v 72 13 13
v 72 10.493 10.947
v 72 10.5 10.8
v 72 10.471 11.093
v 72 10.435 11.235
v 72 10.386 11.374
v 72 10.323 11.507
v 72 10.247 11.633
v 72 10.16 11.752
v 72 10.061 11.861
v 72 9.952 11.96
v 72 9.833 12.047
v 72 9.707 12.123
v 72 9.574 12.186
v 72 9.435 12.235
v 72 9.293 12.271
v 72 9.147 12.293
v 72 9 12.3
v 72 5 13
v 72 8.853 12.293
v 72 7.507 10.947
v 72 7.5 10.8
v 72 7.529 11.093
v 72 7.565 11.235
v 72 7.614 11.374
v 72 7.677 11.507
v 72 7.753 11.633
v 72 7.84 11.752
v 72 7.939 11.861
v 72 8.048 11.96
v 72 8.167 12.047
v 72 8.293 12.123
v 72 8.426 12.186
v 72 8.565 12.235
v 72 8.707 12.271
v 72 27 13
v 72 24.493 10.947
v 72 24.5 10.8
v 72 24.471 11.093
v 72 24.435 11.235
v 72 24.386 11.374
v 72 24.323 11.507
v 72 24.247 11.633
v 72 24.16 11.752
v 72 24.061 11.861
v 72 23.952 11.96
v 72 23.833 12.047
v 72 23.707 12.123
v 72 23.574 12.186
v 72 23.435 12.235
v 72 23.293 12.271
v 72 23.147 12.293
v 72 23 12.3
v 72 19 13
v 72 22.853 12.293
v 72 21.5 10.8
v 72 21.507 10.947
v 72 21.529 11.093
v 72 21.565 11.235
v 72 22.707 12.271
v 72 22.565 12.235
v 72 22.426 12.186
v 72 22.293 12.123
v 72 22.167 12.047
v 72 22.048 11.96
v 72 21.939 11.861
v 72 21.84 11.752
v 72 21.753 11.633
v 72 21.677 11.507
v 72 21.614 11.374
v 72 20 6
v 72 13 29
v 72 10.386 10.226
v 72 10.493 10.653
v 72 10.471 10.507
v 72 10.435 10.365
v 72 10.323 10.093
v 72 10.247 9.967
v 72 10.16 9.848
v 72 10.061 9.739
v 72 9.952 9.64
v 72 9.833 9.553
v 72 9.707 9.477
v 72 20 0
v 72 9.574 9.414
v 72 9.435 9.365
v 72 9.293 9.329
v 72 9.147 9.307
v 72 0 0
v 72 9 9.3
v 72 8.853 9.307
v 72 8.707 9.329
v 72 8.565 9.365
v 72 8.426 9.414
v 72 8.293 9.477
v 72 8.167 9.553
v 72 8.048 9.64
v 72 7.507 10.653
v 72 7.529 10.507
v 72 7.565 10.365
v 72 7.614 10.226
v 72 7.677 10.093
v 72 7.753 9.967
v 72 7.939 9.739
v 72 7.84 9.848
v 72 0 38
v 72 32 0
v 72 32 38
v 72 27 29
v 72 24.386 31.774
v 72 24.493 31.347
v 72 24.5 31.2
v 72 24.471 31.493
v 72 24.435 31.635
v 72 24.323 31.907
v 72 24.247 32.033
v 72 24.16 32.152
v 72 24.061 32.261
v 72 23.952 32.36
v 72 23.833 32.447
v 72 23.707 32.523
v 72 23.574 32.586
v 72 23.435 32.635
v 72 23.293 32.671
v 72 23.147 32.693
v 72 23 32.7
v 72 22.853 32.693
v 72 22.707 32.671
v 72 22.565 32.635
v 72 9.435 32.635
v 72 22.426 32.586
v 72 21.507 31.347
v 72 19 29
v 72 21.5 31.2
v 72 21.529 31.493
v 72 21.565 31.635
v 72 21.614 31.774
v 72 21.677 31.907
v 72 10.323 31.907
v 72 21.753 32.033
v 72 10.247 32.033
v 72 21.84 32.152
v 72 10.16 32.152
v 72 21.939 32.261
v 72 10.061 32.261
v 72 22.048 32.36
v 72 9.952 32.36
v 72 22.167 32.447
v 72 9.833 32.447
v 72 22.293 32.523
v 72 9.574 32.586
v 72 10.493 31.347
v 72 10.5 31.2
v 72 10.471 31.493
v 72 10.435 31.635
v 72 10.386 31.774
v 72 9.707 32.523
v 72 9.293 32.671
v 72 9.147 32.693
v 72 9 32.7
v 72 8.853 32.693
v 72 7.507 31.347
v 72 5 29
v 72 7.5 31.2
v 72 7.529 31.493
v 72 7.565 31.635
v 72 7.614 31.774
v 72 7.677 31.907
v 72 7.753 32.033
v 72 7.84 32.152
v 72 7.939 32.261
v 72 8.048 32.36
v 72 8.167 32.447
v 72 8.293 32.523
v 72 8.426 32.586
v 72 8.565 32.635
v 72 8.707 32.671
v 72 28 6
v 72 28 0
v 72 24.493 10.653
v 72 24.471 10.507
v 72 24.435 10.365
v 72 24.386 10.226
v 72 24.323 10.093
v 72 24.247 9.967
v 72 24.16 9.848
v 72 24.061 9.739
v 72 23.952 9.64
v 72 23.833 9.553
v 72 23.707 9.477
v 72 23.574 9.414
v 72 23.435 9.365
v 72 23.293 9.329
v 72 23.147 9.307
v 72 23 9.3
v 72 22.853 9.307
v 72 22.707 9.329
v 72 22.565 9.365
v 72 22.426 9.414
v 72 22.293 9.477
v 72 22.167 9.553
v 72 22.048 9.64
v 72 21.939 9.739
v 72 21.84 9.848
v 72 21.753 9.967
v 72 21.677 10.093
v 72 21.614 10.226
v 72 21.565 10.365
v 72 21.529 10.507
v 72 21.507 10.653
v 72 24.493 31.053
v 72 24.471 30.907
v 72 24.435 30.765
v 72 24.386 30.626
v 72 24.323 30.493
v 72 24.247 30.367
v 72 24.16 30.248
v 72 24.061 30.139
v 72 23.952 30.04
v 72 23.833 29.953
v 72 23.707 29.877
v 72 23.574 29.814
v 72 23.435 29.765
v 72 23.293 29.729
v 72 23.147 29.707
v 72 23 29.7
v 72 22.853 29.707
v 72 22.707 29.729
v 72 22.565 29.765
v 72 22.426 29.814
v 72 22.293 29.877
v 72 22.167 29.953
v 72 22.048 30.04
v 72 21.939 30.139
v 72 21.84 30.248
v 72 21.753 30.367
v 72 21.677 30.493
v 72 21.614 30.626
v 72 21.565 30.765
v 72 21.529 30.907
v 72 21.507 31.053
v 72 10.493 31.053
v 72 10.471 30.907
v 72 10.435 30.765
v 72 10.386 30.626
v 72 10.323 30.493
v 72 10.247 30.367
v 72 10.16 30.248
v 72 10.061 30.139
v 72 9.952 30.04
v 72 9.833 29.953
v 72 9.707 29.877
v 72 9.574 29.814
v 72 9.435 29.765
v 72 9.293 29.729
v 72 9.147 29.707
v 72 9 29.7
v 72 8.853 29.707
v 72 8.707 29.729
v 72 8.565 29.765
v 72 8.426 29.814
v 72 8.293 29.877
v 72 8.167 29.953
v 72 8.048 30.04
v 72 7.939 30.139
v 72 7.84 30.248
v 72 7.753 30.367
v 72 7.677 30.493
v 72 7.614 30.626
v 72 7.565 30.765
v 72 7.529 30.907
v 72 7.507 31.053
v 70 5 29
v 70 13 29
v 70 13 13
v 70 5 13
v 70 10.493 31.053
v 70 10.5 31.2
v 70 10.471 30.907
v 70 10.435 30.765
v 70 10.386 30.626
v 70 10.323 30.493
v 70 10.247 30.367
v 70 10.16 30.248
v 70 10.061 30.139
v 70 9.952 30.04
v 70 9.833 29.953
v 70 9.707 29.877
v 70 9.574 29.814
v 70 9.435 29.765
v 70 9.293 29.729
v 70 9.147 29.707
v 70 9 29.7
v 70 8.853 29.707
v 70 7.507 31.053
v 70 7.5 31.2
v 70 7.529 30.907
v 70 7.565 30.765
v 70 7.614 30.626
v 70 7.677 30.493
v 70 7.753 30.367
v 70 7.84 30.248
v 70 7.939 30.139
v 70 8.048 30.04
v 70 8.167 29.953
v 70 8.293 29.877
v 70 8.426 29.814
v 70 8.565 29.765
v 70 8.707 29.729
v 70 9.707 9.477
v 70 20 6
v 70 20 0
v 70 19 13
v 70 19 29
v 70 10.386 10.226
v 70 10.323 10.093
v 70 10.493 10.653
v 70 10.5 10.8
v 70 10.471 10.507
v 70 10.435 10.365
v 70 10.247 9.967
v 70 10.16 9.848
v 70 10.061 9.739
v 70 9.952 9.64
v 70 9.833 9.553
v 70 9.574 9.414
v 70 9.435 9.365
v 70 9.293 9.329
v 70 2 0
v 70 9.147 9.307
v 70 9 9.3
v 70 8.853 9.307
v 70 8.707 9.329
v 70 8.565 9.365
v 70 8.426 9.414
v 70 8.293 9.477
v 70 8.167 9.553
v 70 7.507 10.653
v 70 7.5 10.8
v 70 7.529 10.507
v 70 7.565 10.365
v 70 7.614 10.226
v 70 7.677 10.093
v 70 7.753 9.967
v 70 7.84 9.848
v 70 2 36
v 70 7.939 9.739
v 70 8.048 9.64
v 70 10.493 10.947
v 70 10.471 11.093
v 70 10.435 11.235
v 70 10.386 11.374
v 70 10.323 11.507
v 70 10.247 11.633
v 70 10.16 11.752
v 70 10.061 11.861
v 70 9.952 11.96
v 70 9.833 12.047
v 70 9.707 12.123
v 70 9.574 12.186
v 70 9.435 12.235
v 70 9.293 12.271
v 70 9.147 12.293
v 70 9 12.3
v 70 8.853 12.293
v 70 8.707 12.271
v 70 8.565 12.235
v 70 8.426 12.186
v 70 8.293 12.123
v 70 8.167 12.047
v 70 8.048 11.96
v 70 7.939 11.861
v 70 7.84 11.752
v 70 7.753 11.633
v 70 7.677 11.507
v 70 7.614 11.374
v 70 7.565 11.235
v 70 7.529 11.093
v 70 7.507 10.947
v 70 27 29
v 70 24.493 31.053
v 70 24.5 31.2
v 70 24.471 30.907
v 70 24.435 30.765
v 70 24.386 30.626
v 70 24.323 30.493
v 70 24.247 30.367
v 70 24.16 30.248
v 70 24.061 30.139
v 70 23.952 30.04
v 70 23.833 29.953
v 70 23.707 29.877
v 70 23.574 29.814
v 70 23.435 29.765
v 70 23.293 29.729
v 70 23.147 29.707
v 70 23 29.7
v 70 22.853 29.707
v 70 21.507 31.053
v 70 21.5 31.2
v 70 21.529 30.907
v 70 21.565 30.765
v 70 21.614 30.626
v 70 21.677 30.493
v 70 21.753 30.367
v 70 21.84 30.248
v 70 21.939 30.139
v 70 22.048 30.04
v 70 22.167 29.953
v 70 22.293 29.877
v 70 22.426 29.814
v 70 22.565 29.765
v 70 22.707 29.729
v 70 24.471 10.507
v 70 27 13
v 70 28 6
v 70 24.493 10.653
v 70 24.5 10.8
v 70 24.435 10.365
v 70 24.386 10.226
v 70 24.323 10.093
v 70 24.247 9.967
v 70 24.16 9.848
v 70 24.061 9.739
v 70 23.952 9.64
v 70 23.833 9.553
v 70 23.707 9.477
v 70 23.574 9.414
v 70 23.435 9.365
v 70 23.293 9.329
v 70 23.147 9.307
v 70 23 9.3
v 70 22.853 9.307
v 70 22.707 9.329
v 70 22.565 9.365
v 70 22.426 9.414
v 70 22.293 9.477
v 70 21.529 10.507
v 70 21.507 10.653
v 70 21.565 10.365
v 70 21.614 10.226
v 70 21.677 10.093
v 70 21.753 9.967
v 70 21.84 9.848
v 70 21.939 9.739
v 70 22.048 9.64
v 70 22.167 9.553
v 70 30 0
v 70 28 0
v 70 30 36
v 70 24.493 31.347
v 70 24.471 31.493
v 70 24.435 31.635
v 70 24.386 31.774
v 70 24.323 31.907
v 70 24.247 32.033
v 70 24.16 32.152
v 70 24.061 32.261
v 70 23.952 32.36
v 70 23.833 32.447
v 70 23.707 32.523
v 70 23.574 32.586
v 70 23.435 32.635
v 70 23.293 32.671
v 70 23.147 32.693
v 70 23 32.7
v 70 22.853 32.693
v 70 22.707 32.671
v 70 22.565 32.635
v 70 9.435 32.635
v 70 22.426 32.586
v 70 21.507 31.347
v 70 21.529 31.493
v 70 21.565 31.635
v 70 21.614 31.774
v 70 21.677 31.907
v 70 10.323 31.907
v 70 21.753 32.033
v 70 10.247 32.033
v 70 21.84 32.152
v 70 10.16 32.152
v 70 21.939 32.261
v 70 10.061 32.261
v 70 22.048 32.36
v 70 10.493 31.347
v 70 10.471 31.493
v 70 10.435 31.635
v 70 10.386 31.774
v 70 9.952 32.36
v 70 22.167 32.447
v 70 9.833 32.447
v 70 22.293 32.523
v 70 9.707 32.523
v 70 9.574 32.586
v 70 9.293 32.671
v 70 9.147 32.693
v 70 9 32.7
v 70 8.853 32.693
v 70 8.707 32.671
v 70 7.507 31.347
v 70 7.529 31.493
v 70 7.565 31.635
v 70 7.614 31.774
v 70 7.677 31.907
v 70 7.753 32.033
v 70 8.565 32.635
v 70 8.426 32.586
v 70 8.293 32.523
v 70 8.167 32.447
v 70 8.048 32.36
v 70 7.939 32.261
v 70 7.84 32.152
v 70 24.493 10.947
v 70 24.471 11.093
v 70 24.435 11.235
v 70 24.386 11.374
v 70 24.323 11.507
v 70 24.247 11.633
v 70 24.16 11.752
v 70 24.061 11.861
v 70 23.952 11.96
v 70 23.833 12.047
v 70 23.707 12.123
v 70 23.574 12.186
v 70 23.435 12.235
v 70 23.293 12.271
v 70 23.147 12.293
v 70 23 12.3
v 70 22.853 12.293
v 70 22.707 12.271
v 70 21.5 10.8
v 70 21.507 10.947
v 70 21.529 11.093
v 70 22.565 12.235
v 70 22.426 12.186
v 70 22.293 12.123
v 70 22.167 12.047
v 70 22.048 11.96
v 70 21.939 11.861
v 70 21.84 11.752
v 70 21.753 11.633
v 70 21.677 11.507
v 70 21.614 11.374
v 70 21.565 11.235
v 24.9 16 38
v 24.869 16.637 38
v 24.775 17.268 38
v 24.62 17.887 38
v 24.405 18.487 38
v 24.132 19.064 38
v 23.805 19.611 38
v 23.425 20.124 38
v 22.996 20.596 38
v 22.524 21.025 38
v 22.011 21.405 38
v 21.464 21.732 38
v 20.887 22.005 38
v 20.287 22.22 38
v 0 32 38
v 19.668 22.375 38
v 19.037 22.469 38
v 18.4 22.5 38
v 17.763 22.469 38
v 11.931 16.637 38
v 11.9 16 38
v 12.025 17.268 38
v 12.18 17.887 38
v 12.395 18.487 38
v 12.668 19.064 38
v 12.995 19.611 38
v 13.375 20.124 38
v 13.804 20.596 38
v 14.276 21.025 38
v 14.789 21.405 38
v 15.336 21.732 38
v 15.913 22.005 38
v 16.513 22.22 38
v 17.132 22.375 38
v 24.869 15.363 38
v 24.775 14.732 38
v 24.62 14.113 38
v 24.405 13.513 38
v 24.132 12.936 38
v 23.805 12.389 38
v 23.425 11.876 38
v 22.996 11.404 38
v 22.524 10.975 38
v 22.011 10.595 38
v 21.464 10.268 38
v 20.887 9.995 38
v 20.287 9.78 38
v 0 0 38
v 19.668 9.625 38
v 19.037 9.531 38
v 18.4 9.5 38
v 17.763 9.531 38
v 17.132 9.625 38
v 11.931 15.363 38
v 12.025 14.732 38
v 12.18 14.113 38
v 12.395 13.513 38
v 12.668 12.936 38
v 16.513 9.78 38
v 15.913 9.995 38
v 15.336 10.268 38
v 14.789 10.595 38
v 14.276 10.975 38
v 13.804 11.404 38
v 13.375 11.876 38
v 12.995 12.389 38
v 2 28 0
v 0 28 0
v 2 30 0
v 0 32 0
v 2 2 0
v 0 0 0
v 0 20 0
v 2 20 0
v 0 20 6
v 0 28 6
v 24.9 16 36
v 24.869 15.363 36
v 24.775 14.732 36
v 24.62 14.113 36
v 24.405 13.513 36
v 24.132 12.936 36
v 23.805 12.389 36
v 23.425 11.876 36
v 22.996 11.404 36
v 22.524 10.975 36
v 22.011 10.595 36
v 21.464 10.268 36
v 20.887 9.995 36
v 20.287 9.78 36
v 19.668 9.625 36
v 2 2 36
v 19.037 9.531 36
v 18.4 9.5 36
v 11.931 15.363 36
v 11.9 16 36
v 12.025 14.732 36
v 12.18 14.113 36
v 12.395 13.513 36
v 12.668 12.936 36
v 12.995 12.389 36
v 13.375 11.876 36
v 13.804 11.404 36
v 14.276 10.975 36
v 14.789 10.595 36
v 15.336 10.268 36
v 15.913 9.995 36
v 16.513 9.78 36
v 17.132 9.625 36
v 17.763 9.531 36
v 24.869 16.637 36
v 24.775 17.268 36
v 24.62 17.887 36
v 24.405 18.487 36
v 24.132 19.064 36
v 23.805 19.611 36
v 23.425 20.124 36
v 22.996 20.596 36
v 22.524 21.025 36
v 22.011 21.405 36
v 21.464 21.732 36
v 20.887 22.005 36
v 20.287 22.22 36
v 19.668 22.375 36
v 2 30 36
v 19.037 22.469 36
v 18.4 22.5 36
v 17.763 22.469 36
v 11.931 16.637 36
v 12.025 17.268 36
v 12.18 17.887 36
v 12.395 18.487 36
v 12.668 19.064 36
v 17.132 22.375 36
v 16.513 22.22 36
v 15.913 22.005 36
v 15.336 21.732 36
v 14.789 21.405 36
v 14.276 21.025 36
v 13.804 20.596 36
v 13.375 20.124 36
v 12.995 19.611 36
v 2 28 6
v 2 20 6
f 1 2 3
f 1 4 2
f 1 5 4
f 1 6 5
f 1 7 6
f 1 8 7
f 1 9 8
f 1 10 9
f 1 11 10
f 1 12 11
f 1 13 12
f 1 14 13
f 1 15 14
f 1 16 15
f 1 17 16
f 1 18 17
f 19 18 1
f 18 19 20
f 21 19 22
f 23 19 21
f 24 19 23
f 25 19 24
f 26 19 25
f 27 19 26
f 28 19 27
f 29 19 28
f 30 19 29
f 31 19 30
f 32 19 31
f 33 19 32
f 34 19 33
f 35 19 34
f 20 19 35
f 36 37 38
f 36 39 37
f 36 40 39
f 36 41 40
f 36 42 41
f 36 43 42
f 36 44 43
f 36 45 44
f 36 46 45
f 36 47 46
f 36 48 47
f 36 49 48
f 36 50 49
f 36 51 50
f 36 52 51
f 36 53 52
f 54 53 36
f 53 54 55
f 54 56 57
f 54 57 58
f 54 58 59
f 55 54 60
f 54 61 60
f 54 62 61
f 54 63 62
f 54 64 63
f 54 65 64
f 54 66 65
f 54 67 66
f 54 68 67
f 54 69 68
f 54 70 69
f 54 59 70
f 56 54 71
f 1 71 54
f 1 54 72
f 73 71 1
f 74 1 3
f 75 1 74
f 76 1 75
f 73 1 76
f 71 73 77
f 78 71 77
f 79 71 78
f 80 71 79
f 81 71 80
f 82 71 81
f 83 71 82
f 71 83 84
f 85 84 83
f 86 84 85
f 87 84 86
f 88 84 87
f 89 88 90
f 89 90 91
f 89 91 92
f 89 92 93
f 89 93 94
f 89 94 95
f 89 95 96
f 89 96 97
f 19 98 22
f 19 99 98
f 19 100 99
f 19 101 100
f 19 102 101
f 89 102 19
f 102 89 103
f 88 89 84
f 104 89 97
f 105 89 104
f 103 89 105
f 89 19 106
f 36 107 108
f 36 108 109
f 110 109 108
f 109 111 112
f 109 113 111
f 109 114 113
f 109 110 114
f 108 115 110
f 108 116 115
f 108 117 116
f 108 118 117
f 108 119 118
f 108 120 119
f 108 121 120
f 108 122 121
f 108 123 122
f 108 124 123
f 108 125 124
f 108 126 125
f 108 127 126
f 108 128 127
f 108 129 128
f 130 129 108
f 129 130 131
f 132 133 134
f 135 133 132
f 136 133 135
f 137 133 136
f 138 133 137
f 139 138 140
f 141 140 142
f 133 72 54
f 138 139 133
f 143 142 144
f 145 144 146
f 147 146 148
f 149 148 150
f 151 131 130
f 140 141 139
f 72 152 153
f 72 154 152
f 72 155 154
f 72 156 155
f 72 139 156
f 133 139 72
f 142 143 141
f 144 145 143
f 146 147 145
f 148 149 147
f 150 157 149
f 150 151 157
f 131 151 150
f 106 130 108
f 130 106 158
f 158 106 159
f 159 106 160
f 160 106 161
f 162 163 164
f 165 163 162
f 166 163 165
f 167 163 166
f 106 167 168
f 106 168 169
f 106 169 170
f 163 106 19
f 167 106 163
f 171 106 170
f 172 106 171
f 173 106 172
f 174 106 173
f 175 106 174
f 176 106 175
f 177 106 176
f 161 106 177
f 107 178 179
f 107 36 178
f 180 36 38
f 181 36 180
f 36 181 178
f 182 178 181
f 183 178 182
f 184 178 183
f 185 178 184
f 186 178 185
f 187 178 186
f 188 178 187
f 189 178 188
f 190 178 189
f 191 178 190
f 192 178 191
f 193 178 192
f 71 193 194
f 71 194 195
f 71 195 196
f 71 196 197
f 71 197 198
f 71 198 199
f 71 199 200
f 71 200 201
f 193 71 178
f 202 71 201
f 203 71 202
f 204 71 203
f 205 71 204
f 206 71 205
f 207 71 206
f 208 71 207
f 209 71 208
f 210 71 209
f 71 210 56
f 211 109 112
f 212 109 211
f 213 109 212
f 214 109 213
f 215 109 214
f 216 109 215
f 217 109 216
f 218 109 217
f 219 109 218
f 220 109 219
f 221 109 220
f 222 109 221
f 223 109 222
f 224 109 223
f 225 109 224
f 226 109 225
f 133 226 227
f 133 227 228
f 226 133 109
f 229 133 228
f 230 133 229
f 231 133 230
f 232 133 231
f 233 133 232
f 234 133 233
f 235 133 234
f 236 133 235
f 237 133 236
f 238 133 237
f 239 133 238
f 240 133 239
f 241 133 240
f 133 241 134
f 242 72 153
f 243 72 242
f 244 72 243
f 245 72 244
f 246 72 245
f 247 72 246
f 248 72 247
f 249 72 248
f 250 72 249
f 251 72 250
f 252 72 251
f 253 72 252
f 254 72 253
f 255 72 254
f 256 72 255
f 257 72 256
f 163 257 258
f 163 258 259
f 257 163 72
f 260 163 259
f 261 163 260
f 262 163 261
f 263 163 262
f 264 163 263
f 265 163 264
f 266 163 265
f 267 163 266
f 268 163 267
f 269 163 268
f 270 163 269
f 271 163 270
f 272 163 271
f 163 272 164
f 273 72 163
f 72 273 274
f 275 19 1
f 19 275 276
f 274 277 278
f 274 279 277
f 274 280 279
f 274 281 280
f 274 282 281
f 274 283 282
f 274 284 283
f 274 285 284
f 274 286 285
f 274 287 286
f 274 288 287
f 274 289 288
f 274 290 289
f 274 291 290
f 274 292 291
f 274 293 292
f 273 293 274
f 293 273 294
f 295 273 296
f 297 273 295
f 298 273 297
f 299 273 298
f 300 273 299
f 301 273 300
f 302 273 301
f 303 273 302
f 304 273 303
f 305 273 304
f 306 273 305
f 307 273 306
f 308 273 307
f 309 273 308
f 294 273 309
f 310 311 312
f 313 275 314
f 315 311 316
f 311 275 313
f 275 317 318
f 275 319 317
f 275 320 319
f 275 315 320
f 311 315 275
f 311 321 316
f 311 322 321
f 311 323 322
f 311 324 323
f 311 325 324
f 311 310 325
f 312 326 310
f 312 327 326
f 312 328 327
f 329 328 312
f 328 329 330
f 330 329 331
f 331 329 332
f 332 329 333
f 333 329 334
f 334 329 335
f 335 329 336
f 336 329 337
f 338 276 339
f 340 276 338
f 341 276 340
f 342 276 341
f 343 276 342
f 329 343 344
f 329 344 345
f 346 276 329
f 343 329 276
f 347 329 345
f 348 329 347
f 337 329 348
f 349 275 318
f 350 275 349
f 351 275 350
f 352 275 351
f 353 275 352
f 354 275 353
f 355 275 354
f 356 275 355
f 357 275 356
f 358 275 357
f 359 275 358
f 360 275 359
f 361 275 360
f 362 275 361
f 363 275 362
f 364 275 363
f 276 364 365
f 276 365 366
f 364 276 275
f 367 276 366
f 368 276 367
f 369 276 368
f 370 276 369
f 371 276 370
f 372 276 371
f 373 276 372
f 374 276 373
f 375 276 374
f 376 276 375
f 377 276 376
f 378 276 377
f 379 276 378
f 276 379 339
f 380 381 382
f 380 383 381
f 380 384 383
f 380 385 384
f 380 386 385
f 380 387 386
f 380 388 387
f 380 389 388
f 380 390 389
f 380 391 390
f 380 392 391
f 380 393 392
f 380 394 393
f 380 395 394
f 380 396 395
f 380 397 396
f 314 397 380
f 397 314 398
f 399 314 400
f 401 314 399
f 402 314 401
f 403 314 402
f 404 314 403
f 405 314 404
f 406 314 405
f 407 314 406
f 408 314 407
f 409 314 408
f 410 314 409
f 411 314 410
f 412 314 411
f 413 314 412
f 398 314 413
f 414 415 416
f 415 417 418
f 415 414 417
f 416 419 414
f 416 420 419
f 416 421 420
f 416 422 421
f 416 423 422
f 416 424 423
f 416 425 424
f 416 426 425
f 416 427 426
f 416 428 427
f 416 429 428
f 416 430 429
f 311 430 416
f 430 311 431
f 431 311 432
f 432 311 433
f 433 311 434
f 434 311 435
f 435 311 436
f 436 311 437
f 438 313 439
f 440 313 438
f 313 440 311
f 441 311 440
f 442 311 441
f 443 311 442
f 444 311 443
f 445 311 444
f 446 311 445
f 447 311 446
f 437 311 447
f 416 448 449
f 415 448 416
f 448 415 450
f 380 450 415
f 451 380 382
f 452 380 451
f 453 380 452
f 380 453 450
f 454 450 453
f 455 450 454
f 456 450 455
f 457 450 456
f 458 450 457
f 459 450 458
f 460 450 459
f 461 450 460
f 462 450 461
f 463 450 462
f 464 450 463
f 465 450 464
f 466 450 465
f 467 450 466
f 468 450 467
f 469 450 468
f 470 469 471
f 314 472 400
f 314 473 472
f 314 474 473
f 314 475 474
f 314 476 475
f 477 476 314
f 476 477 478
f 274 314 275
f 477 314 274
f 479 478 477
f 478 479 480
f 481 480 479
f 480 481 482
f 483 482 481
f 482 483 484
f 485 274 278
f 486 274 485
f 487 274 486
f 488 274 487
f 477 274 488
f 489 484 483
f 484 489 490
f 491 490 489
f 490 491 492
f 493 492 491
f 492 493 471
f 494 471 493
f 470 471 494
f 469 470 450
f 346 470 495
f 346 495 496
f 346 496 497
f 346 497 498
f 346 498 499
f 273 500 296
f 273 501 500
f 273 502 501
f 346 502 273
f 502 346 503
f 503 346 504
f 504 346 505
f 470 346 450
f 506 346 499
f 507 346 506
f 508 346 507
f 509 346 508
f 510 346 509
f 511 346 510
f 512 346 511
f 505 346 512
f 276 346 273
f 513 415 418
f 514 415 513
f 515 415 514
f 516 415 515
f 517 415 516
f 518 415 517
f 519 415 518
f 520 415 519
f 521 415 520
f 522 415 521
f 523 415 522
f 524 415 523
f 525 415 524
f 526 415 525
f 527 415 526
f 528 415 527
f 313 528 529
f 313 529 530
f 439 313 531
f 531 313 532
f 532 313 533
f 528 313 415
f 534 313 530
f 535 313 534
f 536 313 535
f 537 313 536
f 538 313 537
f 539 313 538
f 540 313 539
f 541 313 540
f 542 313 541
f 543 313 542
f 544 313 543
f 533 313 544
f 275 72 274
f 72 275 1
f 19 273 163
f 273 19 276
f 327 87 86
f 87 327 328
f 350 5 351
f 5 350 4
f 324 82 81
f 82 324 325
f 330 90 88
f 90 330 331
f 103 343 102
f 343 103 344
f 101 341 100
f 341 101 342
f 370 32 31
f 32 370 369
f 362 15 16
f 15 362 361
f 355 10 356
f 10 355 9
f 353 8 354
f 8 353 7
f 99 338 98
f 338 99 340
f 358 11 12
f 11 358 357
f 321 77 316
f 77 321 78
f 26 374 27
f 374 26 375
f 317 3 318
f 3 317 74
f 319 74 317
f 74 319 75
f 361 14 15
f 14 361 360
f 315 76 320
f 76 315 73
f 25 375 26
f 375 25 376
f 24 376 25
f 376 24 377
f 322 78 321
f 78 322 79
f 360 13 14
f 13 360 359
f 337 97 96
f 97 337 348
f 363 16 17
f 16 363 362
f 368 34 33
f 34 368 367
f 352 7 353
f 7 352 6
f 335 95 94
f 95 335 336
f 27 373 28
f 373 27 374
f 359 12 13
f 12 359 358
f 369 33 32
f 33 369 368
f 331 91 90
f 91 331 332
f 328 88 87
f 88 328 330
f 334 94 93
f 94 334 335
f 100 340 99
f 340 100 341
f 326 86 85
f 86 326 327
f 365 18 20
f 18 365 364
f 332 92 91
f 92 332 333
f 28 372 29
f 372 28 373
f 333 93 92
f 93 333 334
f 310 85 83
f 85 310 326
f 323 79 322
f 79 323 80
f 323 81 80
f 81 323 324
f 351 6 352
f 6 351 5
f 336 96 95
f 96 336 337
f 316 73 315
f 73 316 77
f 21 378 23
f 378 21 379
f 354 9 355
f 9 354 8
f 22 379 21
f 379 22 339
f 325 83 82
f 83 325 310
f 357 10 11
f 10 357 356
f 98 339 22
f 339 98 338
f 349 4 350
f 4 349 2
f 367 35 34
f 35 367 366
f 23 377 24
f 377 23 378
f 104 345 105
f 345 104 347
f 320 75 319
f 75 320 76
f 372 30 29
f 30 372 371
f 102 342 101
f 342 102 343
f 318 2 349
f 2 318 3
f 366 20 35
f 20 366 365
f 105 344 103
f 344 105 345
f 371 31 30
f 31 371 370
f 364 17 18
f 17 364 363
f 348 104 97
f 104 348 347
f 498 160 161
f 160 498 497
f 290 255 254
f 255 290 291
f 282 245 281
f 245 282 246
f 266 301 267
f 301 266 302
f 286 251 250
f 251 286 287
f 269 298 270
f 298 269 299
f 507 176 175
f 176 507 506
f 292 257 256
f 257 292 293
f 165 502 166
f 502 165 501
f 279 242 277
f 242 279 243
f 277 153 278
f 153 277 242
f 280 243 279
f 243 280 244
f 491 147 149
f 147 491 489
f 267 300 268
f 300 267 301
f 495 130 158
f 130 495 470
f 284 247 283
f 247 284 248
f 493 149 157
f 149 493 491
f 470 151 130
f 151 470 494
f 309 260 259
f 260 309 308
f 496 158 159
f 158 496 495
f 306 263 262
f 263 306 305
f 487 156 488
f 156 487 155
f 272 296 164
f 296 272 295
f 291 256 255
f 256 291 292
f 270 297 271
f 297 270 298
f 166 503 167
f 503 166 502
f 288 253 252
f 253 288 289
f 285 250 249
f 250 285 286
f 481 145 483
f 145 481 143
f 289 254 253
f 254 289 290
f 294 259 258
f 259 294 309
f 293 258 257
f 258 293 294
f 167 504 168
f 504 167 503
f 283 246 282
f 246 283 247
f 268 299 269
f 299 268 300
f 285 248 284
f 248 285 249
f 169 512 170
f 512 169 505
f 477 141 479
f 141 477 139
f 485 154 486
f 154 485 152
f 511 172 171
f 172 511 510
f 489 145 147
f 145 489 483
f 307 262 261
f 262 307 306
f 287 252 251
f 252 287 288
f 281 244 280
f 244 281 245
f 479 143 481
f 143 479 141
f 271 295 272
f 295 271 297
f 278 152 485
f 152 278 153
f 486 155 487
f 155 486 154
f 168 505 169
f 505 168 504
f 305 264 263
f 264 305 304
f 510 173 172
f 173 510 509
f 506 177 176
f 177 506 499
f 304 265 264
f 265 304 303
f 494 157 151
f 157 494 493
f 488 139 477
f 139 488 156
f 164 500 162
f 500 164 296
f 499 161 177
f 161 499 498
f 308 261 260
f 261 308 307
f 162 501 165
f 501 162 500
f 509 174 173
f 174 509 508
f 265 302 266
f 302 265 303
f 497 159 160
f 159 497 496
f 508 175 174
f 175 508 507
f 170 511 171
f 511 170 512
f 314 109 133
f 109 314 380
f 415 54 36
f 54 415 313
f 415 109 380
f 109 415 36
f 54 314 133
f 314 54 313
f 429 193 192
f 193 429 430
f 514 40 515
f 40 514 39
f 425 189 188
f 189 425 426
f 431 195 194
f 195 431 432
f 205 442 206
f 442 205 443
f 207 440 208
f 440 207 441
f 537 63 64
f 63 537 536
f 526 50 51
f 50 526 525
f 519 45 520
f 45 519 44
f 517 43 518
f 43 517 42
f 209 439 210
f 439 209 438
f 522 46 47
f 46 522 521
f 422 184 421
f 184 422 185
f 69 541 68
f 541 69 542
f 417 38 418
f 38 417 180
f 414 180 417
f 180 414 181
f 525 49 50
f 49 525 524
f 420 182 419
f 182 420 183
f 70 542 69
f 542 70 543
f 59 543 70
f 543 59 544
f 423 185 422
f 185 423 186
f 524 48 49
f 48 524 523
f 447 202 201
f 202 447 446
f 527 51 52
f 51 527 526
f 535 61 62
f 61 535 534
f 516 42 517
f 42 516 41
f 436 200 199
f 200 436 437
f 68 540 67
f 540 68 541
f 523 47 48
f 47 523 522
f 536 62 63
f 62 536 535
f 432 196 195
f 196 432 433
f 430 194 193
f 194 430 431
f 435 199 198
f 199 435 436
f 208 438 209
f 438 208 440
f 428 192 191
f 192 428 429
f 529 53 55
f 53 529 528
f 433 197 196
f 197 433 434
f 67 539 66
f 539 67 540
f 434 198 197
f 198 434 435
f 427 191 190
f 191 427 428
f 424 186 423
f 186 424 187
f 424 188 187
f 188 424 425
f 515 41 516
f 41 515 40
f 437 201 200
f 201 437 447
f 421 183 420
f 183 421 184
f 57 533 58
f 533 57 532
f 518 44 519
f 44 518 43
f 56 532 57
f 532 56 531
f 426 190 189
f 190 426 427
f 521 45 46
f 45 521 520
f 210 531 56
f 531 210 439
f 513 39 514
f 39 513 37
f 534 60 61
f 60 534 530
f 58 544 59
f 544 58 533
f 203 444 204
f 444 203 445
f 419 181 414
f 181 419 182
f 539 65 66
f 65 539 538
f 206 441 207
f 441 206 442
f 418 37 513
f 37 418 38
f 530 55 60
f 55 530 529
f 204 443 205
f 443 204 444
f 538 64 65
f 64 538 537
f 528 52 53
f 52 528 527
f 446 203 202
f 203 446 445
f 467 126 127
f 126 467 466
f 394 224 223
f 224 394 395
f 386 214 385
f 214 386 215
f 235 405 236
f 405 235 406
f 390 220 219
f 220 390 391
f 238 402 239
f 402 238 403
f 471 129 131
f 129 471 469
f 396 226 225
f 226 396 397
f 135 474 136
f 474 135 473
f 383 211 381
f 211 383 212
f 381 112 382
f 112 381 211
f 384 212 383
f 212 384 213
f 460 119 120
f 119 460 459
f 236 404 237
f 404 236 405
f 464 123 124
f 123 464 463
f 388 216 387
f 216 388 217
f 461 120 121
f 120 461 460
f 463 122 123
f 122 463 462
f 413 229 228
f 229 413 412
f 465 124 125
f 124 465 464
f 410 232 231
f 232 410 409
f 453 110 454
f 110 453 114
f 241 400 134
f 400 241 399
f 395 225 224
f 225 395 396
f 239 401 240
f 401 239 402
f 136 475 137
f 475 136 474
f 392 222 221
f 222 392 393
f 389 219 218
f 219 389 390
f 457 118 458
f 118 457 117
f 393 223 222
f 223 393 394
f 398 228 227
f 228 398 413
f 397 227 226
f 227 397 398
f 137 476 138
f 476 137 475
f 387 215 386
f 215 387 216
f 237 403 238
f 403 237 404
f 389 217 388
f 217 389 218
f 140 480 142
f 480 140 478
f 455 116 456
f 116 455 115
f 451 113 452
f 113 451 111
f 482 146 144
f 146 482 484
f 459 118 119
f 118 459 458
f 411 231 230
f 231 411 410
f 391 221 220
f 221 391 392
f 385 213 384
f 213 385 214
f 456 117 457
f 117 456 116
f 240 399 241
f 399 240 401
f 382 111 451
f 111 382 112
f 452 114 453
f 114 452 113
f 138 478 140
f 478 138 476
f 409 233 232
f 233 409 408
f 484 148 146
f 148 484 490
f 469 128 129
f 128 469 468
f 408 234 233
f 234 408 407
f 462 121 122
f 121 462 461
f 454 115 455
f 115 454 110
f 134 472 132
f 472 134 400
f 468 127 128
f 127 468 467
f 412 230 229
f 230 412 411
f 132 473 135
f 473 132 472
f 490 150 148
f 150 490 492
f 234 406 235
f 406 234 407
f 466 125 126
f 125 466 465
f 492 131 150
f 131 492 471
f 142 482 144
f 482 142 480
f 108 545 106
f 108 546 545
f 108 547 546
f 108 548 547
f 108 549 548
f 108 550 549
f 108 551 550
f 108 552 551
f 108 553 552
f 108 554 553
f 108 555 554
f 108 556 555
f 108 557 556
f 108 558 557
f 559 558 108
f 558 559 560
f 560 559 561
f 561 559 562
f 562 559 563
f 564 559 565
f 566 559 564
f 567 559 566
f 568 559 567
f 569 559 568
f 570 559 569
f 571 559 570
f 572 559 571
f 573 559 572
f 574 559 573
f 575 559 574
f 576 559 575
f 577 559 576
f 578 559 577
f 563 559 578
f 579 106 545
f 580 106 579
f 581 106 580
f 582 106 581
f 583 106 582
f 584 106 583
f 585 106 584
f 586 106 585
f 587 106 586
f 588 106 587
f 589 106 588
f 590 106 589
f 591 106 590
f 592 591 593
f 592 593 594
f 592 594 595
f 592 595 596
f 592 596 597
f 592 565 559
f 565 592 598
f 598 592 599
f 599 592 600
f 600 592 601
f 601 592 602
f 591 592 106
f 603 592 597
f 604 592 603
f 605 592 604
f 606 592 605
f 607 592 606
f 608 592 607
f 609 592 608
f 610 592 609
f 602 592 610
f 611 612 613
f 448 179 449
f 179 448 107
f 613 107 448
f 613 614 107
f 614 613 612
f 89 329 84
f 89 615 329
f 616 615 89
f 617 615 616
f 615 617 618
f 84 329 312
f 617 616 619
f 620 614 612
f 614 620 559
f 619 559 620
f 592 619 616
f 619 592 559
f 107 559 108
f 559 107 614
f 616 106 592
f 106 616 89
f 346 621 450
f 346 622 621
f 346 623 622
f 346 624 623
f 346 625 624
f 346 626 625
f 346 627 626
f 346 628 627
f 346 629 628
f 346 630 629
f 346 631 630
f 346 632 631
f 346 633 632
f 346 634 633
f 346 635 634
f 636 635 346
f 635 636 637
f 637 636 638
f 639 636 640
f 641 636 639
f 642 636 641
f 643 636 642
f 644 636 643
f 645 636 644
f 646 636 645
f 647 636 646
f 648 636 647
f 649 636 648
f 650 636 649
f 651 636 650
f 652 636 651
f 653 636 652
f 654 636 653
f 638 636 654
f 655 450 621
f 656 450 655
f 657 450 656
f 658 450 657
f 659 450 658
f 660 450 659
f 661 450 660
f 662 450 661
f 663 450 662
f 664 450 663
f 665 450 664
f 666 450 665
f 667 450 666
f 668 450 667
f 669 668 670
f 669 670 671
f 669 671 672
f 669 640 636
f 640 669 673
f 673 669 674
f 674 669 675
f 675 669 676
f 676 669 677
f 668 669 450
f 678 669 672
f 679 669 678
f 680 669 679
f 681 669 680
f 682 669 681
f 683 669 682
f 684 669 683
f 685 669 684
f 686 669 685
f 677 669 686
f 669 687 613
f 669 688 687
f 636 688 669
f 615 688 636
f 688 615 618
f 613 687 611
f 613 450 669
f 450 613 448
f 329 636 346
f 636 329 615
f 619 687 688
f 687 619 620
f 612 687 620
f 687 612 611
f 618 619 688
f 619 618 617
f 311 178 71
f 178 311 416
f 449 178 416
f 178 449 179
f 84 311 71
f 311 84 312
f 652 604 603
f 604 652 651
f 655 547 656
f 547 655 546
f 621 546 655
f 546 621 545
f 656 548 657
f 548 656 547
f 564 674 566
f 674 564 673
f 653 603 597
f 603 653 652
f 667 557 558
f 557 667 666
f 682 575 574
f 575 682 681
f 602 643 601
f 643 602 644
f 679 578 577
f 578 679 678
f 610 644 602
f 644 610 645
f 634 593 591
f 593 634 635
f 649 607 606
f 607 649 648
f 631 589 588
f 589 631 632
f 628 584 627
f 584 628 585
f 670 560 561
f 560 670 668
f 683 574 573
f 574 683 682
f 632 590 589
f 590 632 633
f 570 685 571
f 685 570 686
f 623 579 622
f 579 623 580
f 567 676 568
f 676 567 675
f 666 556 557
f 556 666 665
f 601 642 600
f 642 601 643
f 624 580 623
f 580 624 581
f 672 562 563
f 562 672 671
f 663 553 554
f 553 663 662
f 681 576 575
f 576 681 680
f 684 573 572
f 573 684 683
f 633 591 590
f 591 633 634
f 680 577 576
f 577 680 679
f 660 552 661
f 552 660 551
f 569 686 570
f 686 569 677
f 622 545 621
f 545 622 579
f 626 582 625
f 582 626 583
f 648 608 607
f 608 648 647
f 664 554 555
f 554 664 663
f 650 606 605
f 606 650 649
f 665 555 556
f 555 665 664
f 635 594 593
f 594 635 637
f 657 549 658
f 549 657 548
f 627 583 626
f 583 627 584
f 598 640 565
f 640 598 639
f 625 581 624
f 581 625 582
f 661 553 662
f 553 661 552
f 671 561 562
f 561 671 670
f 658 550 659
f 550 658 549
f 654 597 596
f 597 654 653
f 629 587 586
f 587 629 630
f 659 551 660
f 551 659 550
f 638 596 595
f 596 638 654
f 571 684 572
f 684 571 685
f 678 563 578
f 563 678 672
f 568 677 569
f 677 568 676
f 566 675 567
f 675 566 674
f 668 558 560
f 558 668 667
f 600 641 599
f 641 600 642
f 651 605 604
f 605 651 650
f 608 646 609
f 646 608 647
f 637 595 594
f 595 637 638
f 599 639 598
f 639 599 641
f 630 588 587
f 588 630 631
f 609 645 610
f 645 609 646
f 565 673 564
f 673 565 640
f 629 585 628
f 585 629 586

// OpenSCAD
$fn = 64;

switch_d = 22.6;
switch_w = 30;

// box_w = 50;
box_w = 68;
box_d = 28;
box_h = 36;

connector_w = 16;
connector_d = 8;

thickness = 2;

cable_hole = 4;

switch_hole = 13;
switch_distance = 18.4;

switch_h = 28;
switch_w = 12;

render() difference() {
  cube([box_w + thickness * 2, box_d + thickness * 2, box_h + thickness]);
  translate([thickness, thickness, 0]) {
    cube([box_w, box_d, box_h]);
  }
  translate([0, box_d - cable_hole - thickness * 2, 0]) {
    cube([thickness, cable_hole * 2, cable_hole + thickness]);
  }
  translate([box_w + thickness, box_d - cable_hole - thickness * 2, 0]) {
    cube([thickness, cable_hole * 2, cable_hole + thickness]);
  }
  translate([switch_distance, (box_d + thickness * 2) / 2, 0]) {
    cylinder(h = 150, r = switch_hole / 2, center = true);
  }
  translate([0, 5, 13]) {
    translate([box_w + thickness, 0, 0]) {
      translate([0, -2, -6]) {
        % cube([thickness, switch_w, switch_h]);
      }
      cube([thickness, connector_d, connector_w]);
      translate([0, 4, -2.2]) {
        rotate(90, [0, 1, 0]) {
          cylinder(r = 1.5, h = 10);
        }
      }
      translate([0, 4, 18.2]) {
        rotate(90, [0, 1, 0]) {
          cylinder(r = 1.5, h = 10);
        }
      }
    }
  }
  translate([0, 19, 13]) {
    translate([box_w + thickness, 0, 0]) {
      translate([0, -2, -6]) {
        % cube([thickness, switch_w, switch_h]);
      }
      cube([thickness, connector_d, connector_w]);
      translate([0, 4, -2.2]) {
        rotate(90, [0, 1, 0]) {
          cylinder(r = 1.5, h = 10);
        }
      }
      translate([0, 4, 18.2]) {
        rotate(90, [0, 1, 0]) {
          cylinder(r = 1.5, h = 10);
        }
      }
    }
  }
}
